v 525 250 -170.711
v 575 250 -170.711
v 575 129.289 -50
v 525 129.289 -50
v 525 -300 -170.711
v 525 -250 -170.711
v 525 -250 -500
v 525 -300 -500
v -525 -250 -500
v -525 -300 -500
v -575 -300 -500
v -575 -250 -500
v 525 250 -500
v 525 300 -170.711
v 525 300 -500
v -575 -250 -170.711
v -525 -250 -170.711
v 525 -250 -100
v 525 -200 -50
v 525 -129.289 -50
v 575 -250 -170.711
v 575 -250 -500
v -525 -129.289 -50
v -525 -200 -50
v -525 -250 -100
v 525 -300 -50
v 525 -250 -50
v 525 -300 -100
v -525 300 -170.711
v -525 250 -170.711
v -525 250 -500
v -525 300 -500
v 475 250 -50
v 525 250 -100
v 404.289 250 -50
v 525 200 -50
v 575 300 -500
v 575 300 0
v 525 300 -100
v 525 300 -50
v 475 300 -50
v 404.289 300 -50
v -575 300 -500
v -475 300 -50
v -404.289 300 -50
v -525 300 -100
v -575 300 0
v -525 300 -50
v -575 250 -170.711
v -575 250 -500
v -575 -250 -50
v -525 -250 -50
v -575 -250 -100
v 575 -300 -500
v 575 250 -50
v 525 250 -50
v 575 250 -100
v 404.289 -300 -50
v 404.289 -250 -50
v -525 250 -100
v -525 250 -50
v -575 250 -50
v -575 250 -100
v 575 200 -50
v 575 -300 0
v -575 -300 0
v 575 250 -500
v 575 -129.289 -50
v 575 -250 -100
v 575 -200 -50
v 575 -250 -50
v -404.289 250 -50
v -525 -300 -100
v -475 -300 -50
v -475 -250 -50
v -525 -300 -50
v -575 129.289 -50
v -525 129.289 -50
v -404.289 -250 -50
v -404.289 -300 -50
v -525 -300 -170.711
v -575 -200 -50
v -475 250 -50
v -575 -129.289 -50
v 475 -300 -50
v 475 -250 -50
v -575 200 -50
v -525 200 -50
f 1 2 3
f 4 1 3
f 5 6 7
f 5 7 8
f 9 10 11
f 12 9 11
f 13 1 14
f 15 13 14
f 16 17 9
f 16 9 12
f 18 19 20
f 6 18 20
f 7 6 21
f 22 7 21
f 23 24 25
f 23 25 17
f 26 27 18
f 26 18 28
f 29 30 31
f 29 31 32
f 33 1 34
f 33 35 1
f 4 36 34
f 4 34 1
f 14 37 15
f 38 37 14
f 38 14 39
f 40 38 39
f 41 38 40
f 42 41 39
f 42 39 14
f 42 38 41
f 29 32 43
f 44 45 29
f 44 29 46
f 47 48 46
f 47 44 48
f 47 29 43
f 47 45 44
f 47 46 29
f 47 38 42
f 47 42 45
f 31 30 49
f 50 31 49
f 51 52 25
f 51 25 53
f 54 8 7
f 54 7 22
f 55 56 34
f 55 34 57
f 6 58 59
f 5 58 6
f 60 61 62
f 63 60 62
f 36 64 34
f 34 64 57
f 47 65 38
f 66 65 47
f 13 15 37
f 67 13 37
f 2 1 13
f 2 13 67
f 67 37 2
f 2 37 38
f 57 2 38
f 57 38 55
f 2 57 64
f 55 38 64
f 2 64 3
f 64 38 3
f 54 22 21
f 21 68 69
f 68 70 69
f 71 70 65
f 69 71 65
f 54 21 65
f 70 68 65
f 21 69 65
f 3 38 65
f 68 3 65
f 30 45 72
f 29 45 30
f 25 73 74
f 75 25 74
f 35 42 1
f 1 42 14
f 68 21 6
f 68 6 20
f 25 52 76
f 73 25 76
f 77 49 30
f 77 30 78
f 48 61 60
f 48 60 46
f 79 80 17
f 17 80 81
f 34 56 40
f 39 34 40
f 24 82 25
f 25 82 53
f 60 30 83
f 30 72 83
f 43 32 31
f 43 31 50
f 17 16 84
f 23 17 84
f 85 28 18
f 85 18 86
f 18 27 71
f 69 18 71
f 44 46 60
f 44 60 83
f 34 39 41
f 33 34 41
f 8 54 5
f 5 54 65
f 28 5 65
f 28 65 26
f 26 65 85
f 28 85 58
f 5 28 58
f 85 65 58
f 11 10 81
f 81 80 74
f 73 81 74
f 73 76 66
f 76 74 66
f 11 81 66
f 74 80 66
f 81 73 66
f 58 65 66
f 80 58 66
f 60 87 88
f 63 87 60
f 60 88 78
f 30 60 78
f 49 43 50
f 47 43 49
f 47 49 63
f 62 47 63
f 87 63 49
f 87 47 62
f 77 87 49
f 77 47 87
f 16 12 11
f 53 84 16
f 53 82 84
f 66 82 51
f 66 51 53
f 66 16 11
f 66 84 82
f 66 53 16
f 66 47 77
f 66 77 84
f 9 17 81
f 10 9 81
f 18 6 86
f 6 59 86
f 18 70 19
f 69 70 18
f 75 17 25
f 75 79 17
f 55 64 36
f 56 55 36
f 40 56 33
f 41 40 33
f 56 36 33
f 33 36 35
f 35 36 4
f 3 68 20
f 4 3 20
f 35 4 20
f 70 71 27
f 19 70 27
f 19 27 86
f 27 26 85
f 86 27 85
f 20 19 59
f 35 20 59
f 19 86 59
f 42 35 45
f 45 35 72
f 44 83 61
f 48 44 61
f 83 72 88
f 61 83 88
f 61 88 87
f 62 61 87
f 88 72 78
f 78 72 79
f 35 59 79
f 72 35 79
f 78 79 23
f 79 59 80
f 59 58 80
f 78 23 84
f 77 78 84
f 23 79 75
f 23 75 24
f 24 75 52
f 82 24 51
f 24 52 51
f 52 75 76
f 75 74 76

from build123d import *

# Parameters (mm, degrees)
F0_W     = 575
F0_H     = 300
F1_DEPTH = 50
F2_W     = 50
F2_H     = 50
F3_DEPTH = 450
F5_DEPTH = 50
F7_DEPTH = 50


with BuildPart() as f1:
    # F0 (on Top) → F1 (new body)
    with BuildSketch(Plane.XY):
        with Locations((287.5, -150)):
            Rectangle(F0_W, F0_H)
    extrude(amount=-F1_DEPTH)

    # F2 (on face) → F3 (join)
    with BuildSketch(Plane(origin=(0, 0, -50), x_dir=(1, 0, 0), z_dir=(0, 0, -1))):
        with Locations((550, 275)):
            Rectangle(F2_W, F2_H)
    extrude(amount=F3_DEPTH)

    # F4 (on face) → F5 (join, through all)
    with BuildSketch(Plane.XZ.offset(300)):
        Polygon((525, -170.710678), (525, -100), (475, -50), (404.289322, -50), align=None)
    extrude(amount=-F5_DEPTH)

    # F6 (on face) → F7 (join, through all)
    with BuildSketch(Plane.YZ.offset(575)):
        Polygon((-200, -50), (-250, -100), (-250, -170.710678), (-129.289322, -50), align=None)
    extrude(amount=-F7_DEPTH)

    # F8: F1 across plane


with BuildPart() as f1_1:
    add(f1.part)
    add(f1.part.mirror(Plane.YZ))

    # F9: F1 across plane


with BuildPart() as f1_2:
    add(f1_1.part)
    add(f1_1.part.mirror(Plane.XZ))


solid = f1_2.part
